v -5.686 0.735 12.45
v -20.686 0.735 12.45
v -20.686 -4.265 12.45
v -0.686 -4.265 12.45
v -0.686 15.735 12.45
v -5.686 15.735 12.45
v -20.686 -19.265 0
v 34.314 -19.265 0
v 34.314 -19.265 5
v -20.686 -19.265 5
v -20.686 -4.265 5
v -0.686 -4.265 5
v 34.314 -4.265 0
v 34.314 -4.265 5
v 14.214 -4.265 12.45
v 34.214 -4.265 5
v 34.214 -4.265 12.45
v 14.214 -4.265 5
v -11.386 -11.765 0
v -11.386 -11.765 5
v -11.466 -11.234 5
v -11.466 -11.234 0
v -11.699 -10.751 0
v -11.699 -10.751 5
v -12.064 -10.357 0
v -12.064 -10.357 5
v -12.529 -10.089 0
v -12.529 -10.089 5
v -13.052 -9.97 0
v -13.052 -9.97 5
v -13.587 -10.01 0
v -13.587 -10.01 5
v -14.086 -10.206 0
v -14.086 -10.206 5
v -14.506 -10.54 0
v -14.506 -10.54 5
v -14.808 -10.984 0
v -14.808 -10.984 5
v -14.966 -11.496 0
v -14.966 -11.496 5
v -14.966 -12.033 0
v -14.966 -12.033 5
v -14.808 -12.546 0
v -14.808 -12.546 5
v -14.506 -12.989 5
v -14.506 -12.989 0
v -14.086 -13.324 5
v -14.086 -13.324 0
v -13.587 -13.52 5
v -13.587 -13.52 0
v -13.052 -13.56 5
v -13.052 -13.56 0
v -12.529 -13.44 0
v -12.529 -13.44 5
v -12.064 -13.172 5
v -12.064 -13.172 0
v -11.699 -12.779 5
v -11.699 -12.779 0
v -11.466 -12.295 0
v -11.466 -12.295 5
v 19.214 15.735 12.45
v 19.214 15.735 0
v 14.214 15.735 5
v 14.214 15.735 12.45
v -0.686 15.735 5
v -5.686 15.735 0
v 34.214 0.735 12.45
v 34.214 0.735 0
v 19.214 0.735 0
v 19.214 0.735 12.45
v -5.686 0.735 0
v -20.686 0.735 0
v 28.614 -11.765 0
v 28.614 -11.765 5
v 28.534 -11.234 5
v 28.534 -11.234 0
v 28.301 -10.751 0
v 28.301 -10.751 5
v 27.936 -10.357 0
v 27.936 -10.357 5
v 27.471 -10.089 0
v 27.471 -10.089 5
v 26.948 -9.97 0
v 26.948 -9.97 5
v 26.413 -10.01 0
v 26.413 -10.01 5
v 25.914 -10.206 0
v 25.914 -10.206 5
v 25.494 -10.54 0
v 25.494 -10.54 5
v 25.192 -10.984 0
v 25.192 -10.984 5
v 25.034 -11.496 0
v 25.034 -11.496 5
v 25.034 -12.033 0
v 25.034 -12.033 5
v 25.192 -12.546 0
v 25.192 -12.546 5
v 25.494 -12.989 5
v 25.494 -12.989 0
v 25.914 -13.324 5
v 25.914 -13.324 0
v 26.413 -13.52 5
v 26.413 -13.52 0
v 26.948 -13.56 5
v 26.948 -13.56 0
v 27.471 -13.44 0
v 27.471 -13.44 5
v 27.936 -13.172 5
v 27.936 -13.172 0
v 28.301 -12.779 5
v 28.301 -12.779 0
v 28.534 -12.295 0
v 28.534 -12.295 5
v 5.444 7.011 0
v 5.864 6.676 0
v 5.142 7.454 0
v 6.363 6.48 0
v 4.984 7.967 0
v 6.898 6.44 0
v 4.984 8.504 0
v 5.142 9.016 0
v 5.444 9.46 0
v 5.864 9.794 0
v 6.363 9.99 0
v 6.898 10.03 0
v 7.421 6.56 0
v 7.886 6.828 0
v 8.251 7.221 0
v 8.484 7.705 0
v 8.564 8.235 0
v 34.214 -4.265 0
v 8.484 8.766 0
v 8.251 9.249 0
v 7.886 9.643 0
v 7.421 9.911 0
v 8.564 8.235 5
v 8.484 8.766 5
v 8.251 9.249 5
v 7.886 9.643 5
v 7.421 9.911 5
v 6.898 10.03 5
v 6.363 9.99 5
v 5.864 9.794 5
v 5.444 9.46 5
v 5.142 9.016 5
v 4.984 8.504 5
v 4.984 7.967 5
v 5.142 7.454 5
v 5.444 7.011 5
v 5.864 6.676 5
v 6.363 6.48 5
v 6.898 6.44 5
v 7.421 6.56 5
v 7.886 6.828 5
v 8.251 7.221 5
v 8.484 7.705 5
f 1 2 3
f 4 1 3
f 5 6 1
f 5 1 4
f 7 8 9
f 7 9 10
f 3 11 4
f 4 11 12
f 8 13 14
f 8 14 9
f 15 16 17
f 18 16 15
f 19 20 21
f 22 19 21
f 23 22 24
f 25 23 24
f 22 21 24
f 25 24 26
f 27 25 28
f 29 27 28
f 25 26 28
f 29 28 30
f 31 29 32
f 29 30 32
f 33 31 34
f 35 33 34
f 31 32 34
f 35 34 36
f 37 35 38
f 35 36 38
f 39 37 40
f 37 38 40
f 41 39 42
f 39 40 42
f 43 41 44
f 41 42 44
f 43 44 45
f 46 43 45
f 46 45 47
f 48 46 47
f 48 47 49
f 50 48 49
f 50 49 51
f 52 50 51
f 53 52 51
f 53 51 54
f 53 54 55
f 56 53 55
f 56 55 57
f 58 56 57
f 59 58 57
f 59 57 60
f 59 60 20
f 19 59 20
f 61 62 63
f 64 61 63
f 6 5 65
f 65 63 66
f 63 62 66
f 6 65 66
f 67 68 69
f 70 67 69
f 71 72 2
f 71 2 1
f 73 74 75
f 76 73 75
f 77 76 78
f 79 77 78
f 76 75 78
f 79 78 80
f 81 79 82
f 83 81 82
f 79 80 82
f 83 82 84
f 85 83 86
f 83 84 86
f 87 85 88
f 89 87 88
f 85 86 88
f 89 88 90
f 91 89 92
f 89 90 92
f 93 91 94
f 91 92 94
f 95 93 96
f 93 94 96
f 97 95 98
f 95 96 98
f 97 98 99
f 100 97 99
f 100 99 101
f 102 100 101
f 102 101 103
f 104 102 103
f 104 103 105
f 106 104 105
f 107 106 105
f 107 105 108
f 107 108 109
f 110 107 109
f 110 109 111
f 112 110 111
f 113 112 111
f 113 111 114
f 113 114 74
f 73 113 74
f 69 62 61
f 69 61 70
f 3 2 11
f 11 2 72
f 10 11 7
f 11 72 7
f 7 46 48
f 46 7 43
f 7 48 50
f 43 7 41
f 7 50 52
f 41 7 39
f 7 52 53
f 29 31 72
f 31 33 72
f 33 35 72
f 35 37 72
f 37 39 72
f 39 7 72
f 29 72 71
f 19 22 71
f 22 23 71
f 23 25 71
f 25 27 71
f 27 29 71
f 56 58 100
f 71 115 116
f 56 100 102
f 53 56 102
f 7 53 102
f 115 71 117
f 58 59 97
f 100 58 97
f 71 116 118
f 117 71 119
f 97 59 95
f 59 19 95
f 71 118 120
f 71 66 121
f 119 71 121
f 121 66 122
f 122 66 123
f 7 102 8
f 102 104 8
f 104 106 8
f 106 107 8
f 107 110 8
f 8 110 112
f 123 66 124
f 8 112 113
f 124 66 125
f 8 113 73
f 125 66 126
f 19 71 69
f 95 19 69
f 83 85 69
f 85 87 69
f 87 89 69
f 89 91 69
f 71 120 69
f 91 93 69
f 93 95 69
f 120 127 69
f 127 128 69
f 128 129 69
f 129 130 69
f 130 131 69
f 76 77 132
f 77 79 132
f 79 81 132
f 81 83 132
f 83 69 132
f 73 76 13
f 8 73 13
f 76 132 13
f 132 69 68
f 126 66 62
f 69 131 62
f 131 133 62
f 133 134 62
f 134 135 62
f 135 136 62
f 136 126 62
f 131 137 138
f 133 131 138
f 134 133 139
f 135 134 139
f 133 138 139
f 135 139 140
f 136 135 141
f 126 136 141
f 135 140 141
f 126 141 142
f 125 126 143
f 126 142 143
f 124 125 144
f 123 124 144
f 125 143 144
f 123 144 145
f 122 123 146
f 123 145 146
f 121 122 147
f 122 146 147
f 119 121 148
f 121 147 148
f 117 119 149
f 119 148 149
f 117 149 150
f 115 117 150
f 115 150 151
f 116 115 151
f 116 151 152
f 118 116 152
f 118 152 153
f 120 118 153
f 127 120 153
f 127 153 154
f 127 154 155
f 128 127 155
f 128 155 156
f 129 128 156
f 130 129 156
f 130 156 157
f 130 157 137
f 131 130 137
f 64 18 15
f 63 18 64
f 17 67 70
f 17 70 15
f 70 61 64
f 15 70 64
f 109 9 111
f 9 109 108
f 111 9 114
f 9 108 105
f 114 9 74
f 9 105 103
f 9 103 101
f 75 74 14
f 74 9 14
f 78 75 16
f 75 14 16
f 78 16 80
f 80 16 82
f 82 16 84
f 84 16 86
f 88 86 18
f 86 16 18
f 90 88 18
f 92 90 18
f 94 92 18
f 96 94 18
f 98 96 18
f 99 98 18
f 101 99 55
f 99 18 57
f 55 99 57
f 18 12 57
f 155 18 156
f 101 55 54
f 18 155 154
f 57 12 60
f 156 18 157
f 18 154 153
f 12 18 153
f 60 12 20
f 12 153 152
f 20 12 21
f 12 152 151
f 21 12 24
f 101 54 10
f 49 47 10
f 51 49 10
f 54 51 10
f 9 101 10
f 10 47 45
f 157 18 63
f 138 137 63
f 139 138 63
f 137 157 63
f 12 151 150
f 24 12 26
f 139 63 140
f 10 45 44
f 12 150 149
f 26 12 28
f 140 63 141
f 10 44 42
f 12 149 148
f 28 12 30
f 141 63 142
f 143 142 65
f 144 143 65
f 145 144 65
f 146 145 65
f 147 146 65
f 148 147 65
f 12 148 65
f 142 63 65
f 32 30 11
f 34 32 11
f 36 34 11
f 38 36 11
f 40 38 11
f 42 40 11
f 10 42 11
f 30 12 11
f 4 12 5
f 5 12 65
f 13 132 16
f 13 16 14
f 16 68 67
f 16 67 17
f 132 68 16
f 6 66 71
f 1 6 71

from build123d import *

# Parameters (mm, degrees)
BOSS_EXTRUDE1_DEPTH = 5
BOSS_EXTRUDE2_DEPTH = 12.45
SKETCH6_R           = 1.8
CUT_EXTRUDE3_DEPTH  = 6


with BuildPart() as part:
    # Sketch1 → Boss-Extrude1 (new body)
    with BuildSketch(Plane.XY):
        Polygon((14.31372549, -4.264705882), (34.31372549, -4.264705882), (34.31372549, -19.264705882), (-20.68627451, -19.264705882), (-20.68627451, -4.264705882), (-0.68627451, -4.264705882), (-0.68627451, 15.735294118), (14.31372549, 15.735294118), align=None)
    extrude(amount=BOSS_EXTRUDE1_DEPTH)

    # Sketch2 → Boss-Extrude2 (add)
    with BuildSketch(Plane(origin=(0, 0, 0), x_dir=(-1, 0, 0), z_dir=(0, 0, -1))):
        Polygon((0.68627451, 15.735294118), (5.68627451, 15.735294118), (5.68627451, 0.735294118), (6.079970528, 0.735294118), (20.68627451, 0.735294118), (20.68627451, -4.264705882), (0.68627451, -4.264705882), align=None)
    boss_extrude2 = extrude(amount=-BOSS_EXTRUDE2_DEPTH)

    # Mirror1: Boss-Extrude2 across plane
    add(boss_extrude2.mirror(Plane.ZY.offset(-6.76372549)))

    # Sketch6 → Cut-Extrude3 (cut, through all)
    with BuildSketch(Plane.XY.offset(5)):
        with Locations((6.76372549, 8.235294118)):
            Circle(SKETCH6_R)
        with Locations((-13.18627451, -11.764705882)):
            Circle(SKETCH6_R)
        with Locations((26.81372549, -11.764705882)):
            Circle(SKETCH6_R)
    extrude(amount=-CUT_EXTRUDE3_DEPTH, mode=Mode.SUBTRACT)


solid = part.part
